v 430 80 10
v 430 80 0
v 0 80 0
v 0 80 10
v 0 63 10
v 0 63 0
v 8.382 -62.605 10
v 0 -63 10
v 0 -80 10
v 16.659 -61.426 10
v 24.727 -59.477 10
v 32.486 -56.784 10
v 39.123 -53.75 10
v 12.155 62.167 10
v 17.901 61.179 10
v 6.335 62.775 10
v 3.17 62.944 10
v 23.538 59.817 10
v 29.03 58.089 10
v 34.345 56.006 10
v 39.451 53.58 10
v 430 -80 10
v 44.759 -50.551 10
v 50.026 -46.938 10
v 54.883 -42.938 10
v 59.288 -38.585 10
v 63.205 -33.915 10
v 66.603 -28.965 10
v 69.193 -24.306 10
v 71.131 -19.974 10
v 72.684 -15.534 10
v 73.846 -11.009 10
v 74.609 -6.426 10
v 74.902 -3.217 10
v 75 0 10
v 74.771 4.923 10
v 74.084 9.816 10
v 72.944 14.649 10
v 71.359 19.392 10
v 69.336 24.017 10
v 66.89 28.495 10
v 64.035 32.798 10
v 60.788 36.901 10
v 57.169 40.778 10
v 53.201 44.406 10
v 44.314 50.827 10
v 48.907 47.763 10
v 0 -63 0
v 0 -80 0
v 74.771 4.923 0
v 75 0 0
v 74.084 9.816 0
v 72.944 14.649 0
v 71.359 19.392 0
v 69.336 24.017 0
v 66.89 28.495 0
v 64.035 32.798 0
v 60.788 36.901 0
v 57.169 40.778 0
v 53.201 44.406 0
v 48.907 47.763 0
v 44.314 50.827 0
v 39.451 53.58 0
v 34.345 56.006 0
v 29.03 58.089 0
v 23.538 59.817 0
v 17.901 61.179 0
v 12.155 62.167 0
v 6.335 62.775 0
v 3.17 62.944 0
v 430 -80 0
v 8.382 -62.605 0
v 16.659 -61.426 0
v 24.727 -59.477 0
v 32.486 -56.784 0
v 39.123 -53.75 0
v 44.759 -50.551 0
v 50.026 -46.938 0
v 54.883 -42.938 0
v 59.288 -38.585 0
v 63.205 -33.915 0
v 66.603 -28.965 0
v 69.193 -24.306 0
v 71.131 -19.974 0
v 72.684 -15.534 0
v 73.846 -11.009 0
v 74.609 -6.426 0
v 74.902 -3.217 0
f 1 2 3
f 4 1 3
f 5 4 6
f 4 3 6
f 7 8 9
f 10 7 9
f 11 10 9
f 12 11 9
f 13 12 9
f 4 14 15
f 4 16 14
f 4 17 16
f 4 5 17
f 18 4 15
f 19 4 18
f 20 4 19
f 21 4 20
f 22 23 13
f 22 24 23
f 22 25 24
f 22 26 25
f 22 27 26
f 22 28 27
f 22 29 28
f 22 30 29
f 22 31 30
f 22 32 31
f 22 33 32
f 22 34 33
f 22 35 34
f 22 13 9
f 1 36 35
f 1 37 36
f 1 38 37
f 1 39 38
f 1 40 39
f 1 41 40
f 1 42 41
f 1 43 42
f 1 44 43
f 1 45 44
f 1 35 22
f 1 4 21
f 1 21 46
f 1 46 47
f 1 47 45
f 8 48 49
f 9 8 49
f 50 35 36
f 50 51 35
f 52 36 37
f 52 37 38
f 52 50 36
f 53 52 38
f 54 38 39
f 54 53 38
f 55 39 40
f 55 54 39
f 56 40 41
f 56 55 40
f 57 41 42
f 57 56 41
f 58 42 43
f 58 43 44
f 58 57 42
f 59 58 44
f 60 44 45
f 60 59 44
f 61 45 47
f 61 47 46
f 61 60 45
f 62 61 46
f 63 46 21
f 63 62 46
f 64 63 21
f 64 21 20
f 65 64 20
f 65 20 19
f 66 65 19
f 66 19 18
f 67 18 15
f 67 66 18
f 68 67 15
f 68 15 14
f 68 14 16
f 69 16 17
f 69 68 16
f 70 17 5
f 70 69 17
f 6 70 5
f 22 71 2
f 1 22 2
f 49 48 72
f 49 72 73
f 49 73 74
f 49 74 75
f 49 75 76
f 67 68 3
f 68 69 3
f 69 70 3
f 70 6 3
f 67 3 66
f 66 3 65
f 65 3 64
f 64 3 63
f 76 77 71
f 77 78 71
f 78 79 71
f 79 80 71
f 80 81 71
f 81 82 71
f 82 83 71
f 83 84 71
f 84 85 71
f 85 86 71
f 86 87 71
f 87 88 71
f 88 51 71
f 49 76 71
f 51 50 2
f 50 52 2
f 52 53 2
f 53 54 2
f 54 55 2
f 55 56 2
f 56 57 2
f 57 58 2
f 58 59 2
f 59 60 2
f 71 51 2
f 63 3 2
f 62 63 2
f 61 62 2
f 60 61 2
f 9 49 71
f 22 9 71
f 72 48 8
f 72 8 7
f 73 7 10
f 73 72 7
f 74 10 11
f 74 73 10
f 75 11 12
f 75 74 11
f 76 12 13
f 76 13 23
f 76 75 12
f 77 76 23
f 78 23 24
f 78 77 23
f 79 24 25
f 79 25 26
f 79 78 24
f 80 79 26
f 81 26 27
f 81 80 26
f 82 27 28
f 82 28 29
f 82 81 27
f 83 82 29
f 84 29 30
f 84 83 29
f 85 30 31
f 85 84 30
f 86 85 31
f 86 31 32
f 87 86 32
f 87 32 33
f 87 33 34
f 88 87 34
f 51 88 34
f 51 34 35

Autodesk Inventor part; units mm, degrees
ref_plane "YZ Plane" through (0, 0, 0) normal (1, 0, 0) x (0, 1, 0)
ref_plane "XZ Plane" through (0, 0, 0) normal (0, 1, 0) x (-1, 0, 0)
ref_plane "XY Plane" through (0, 0, 0) normal (0, 0, 1) x (1, 0, 0)
sketch "Sketch1" plane through (0, 0, 0) normal (0, 0, 1) x (1, 0, 0)
  ellipse E0 centre (0, 0) end of major axis (75, 0) minor radius 63
  line L0 (0, -63) -> (0, -80)
  line L1 (0, -80) -> (430, -80)
  line L2 (430, -80) -> (430, 80)
  line L3 (430, 80) -> (0, 80)
  line L4 (0, 80) -> (0, 63)
  line L5 (0, 0) -> (430, 0) construction
  point P0 (0, 71.5)
  dimension "d12" = 75
  dimension "d13" = 63
  dimension "d14" = 160
  dimension "d15" = 430
extrude "Plate1" add sketch "Sketch1" along normal blind 10 contours E0 L4 L3 L2 L1 L0
equation "\"d16\" = Thickness"
equation "\"BendReliefDepth\" = 0.5 * Thickness"
equation "\"Thickness\" = 10"
properties part number "NVPH-345 feeder hose 2"
